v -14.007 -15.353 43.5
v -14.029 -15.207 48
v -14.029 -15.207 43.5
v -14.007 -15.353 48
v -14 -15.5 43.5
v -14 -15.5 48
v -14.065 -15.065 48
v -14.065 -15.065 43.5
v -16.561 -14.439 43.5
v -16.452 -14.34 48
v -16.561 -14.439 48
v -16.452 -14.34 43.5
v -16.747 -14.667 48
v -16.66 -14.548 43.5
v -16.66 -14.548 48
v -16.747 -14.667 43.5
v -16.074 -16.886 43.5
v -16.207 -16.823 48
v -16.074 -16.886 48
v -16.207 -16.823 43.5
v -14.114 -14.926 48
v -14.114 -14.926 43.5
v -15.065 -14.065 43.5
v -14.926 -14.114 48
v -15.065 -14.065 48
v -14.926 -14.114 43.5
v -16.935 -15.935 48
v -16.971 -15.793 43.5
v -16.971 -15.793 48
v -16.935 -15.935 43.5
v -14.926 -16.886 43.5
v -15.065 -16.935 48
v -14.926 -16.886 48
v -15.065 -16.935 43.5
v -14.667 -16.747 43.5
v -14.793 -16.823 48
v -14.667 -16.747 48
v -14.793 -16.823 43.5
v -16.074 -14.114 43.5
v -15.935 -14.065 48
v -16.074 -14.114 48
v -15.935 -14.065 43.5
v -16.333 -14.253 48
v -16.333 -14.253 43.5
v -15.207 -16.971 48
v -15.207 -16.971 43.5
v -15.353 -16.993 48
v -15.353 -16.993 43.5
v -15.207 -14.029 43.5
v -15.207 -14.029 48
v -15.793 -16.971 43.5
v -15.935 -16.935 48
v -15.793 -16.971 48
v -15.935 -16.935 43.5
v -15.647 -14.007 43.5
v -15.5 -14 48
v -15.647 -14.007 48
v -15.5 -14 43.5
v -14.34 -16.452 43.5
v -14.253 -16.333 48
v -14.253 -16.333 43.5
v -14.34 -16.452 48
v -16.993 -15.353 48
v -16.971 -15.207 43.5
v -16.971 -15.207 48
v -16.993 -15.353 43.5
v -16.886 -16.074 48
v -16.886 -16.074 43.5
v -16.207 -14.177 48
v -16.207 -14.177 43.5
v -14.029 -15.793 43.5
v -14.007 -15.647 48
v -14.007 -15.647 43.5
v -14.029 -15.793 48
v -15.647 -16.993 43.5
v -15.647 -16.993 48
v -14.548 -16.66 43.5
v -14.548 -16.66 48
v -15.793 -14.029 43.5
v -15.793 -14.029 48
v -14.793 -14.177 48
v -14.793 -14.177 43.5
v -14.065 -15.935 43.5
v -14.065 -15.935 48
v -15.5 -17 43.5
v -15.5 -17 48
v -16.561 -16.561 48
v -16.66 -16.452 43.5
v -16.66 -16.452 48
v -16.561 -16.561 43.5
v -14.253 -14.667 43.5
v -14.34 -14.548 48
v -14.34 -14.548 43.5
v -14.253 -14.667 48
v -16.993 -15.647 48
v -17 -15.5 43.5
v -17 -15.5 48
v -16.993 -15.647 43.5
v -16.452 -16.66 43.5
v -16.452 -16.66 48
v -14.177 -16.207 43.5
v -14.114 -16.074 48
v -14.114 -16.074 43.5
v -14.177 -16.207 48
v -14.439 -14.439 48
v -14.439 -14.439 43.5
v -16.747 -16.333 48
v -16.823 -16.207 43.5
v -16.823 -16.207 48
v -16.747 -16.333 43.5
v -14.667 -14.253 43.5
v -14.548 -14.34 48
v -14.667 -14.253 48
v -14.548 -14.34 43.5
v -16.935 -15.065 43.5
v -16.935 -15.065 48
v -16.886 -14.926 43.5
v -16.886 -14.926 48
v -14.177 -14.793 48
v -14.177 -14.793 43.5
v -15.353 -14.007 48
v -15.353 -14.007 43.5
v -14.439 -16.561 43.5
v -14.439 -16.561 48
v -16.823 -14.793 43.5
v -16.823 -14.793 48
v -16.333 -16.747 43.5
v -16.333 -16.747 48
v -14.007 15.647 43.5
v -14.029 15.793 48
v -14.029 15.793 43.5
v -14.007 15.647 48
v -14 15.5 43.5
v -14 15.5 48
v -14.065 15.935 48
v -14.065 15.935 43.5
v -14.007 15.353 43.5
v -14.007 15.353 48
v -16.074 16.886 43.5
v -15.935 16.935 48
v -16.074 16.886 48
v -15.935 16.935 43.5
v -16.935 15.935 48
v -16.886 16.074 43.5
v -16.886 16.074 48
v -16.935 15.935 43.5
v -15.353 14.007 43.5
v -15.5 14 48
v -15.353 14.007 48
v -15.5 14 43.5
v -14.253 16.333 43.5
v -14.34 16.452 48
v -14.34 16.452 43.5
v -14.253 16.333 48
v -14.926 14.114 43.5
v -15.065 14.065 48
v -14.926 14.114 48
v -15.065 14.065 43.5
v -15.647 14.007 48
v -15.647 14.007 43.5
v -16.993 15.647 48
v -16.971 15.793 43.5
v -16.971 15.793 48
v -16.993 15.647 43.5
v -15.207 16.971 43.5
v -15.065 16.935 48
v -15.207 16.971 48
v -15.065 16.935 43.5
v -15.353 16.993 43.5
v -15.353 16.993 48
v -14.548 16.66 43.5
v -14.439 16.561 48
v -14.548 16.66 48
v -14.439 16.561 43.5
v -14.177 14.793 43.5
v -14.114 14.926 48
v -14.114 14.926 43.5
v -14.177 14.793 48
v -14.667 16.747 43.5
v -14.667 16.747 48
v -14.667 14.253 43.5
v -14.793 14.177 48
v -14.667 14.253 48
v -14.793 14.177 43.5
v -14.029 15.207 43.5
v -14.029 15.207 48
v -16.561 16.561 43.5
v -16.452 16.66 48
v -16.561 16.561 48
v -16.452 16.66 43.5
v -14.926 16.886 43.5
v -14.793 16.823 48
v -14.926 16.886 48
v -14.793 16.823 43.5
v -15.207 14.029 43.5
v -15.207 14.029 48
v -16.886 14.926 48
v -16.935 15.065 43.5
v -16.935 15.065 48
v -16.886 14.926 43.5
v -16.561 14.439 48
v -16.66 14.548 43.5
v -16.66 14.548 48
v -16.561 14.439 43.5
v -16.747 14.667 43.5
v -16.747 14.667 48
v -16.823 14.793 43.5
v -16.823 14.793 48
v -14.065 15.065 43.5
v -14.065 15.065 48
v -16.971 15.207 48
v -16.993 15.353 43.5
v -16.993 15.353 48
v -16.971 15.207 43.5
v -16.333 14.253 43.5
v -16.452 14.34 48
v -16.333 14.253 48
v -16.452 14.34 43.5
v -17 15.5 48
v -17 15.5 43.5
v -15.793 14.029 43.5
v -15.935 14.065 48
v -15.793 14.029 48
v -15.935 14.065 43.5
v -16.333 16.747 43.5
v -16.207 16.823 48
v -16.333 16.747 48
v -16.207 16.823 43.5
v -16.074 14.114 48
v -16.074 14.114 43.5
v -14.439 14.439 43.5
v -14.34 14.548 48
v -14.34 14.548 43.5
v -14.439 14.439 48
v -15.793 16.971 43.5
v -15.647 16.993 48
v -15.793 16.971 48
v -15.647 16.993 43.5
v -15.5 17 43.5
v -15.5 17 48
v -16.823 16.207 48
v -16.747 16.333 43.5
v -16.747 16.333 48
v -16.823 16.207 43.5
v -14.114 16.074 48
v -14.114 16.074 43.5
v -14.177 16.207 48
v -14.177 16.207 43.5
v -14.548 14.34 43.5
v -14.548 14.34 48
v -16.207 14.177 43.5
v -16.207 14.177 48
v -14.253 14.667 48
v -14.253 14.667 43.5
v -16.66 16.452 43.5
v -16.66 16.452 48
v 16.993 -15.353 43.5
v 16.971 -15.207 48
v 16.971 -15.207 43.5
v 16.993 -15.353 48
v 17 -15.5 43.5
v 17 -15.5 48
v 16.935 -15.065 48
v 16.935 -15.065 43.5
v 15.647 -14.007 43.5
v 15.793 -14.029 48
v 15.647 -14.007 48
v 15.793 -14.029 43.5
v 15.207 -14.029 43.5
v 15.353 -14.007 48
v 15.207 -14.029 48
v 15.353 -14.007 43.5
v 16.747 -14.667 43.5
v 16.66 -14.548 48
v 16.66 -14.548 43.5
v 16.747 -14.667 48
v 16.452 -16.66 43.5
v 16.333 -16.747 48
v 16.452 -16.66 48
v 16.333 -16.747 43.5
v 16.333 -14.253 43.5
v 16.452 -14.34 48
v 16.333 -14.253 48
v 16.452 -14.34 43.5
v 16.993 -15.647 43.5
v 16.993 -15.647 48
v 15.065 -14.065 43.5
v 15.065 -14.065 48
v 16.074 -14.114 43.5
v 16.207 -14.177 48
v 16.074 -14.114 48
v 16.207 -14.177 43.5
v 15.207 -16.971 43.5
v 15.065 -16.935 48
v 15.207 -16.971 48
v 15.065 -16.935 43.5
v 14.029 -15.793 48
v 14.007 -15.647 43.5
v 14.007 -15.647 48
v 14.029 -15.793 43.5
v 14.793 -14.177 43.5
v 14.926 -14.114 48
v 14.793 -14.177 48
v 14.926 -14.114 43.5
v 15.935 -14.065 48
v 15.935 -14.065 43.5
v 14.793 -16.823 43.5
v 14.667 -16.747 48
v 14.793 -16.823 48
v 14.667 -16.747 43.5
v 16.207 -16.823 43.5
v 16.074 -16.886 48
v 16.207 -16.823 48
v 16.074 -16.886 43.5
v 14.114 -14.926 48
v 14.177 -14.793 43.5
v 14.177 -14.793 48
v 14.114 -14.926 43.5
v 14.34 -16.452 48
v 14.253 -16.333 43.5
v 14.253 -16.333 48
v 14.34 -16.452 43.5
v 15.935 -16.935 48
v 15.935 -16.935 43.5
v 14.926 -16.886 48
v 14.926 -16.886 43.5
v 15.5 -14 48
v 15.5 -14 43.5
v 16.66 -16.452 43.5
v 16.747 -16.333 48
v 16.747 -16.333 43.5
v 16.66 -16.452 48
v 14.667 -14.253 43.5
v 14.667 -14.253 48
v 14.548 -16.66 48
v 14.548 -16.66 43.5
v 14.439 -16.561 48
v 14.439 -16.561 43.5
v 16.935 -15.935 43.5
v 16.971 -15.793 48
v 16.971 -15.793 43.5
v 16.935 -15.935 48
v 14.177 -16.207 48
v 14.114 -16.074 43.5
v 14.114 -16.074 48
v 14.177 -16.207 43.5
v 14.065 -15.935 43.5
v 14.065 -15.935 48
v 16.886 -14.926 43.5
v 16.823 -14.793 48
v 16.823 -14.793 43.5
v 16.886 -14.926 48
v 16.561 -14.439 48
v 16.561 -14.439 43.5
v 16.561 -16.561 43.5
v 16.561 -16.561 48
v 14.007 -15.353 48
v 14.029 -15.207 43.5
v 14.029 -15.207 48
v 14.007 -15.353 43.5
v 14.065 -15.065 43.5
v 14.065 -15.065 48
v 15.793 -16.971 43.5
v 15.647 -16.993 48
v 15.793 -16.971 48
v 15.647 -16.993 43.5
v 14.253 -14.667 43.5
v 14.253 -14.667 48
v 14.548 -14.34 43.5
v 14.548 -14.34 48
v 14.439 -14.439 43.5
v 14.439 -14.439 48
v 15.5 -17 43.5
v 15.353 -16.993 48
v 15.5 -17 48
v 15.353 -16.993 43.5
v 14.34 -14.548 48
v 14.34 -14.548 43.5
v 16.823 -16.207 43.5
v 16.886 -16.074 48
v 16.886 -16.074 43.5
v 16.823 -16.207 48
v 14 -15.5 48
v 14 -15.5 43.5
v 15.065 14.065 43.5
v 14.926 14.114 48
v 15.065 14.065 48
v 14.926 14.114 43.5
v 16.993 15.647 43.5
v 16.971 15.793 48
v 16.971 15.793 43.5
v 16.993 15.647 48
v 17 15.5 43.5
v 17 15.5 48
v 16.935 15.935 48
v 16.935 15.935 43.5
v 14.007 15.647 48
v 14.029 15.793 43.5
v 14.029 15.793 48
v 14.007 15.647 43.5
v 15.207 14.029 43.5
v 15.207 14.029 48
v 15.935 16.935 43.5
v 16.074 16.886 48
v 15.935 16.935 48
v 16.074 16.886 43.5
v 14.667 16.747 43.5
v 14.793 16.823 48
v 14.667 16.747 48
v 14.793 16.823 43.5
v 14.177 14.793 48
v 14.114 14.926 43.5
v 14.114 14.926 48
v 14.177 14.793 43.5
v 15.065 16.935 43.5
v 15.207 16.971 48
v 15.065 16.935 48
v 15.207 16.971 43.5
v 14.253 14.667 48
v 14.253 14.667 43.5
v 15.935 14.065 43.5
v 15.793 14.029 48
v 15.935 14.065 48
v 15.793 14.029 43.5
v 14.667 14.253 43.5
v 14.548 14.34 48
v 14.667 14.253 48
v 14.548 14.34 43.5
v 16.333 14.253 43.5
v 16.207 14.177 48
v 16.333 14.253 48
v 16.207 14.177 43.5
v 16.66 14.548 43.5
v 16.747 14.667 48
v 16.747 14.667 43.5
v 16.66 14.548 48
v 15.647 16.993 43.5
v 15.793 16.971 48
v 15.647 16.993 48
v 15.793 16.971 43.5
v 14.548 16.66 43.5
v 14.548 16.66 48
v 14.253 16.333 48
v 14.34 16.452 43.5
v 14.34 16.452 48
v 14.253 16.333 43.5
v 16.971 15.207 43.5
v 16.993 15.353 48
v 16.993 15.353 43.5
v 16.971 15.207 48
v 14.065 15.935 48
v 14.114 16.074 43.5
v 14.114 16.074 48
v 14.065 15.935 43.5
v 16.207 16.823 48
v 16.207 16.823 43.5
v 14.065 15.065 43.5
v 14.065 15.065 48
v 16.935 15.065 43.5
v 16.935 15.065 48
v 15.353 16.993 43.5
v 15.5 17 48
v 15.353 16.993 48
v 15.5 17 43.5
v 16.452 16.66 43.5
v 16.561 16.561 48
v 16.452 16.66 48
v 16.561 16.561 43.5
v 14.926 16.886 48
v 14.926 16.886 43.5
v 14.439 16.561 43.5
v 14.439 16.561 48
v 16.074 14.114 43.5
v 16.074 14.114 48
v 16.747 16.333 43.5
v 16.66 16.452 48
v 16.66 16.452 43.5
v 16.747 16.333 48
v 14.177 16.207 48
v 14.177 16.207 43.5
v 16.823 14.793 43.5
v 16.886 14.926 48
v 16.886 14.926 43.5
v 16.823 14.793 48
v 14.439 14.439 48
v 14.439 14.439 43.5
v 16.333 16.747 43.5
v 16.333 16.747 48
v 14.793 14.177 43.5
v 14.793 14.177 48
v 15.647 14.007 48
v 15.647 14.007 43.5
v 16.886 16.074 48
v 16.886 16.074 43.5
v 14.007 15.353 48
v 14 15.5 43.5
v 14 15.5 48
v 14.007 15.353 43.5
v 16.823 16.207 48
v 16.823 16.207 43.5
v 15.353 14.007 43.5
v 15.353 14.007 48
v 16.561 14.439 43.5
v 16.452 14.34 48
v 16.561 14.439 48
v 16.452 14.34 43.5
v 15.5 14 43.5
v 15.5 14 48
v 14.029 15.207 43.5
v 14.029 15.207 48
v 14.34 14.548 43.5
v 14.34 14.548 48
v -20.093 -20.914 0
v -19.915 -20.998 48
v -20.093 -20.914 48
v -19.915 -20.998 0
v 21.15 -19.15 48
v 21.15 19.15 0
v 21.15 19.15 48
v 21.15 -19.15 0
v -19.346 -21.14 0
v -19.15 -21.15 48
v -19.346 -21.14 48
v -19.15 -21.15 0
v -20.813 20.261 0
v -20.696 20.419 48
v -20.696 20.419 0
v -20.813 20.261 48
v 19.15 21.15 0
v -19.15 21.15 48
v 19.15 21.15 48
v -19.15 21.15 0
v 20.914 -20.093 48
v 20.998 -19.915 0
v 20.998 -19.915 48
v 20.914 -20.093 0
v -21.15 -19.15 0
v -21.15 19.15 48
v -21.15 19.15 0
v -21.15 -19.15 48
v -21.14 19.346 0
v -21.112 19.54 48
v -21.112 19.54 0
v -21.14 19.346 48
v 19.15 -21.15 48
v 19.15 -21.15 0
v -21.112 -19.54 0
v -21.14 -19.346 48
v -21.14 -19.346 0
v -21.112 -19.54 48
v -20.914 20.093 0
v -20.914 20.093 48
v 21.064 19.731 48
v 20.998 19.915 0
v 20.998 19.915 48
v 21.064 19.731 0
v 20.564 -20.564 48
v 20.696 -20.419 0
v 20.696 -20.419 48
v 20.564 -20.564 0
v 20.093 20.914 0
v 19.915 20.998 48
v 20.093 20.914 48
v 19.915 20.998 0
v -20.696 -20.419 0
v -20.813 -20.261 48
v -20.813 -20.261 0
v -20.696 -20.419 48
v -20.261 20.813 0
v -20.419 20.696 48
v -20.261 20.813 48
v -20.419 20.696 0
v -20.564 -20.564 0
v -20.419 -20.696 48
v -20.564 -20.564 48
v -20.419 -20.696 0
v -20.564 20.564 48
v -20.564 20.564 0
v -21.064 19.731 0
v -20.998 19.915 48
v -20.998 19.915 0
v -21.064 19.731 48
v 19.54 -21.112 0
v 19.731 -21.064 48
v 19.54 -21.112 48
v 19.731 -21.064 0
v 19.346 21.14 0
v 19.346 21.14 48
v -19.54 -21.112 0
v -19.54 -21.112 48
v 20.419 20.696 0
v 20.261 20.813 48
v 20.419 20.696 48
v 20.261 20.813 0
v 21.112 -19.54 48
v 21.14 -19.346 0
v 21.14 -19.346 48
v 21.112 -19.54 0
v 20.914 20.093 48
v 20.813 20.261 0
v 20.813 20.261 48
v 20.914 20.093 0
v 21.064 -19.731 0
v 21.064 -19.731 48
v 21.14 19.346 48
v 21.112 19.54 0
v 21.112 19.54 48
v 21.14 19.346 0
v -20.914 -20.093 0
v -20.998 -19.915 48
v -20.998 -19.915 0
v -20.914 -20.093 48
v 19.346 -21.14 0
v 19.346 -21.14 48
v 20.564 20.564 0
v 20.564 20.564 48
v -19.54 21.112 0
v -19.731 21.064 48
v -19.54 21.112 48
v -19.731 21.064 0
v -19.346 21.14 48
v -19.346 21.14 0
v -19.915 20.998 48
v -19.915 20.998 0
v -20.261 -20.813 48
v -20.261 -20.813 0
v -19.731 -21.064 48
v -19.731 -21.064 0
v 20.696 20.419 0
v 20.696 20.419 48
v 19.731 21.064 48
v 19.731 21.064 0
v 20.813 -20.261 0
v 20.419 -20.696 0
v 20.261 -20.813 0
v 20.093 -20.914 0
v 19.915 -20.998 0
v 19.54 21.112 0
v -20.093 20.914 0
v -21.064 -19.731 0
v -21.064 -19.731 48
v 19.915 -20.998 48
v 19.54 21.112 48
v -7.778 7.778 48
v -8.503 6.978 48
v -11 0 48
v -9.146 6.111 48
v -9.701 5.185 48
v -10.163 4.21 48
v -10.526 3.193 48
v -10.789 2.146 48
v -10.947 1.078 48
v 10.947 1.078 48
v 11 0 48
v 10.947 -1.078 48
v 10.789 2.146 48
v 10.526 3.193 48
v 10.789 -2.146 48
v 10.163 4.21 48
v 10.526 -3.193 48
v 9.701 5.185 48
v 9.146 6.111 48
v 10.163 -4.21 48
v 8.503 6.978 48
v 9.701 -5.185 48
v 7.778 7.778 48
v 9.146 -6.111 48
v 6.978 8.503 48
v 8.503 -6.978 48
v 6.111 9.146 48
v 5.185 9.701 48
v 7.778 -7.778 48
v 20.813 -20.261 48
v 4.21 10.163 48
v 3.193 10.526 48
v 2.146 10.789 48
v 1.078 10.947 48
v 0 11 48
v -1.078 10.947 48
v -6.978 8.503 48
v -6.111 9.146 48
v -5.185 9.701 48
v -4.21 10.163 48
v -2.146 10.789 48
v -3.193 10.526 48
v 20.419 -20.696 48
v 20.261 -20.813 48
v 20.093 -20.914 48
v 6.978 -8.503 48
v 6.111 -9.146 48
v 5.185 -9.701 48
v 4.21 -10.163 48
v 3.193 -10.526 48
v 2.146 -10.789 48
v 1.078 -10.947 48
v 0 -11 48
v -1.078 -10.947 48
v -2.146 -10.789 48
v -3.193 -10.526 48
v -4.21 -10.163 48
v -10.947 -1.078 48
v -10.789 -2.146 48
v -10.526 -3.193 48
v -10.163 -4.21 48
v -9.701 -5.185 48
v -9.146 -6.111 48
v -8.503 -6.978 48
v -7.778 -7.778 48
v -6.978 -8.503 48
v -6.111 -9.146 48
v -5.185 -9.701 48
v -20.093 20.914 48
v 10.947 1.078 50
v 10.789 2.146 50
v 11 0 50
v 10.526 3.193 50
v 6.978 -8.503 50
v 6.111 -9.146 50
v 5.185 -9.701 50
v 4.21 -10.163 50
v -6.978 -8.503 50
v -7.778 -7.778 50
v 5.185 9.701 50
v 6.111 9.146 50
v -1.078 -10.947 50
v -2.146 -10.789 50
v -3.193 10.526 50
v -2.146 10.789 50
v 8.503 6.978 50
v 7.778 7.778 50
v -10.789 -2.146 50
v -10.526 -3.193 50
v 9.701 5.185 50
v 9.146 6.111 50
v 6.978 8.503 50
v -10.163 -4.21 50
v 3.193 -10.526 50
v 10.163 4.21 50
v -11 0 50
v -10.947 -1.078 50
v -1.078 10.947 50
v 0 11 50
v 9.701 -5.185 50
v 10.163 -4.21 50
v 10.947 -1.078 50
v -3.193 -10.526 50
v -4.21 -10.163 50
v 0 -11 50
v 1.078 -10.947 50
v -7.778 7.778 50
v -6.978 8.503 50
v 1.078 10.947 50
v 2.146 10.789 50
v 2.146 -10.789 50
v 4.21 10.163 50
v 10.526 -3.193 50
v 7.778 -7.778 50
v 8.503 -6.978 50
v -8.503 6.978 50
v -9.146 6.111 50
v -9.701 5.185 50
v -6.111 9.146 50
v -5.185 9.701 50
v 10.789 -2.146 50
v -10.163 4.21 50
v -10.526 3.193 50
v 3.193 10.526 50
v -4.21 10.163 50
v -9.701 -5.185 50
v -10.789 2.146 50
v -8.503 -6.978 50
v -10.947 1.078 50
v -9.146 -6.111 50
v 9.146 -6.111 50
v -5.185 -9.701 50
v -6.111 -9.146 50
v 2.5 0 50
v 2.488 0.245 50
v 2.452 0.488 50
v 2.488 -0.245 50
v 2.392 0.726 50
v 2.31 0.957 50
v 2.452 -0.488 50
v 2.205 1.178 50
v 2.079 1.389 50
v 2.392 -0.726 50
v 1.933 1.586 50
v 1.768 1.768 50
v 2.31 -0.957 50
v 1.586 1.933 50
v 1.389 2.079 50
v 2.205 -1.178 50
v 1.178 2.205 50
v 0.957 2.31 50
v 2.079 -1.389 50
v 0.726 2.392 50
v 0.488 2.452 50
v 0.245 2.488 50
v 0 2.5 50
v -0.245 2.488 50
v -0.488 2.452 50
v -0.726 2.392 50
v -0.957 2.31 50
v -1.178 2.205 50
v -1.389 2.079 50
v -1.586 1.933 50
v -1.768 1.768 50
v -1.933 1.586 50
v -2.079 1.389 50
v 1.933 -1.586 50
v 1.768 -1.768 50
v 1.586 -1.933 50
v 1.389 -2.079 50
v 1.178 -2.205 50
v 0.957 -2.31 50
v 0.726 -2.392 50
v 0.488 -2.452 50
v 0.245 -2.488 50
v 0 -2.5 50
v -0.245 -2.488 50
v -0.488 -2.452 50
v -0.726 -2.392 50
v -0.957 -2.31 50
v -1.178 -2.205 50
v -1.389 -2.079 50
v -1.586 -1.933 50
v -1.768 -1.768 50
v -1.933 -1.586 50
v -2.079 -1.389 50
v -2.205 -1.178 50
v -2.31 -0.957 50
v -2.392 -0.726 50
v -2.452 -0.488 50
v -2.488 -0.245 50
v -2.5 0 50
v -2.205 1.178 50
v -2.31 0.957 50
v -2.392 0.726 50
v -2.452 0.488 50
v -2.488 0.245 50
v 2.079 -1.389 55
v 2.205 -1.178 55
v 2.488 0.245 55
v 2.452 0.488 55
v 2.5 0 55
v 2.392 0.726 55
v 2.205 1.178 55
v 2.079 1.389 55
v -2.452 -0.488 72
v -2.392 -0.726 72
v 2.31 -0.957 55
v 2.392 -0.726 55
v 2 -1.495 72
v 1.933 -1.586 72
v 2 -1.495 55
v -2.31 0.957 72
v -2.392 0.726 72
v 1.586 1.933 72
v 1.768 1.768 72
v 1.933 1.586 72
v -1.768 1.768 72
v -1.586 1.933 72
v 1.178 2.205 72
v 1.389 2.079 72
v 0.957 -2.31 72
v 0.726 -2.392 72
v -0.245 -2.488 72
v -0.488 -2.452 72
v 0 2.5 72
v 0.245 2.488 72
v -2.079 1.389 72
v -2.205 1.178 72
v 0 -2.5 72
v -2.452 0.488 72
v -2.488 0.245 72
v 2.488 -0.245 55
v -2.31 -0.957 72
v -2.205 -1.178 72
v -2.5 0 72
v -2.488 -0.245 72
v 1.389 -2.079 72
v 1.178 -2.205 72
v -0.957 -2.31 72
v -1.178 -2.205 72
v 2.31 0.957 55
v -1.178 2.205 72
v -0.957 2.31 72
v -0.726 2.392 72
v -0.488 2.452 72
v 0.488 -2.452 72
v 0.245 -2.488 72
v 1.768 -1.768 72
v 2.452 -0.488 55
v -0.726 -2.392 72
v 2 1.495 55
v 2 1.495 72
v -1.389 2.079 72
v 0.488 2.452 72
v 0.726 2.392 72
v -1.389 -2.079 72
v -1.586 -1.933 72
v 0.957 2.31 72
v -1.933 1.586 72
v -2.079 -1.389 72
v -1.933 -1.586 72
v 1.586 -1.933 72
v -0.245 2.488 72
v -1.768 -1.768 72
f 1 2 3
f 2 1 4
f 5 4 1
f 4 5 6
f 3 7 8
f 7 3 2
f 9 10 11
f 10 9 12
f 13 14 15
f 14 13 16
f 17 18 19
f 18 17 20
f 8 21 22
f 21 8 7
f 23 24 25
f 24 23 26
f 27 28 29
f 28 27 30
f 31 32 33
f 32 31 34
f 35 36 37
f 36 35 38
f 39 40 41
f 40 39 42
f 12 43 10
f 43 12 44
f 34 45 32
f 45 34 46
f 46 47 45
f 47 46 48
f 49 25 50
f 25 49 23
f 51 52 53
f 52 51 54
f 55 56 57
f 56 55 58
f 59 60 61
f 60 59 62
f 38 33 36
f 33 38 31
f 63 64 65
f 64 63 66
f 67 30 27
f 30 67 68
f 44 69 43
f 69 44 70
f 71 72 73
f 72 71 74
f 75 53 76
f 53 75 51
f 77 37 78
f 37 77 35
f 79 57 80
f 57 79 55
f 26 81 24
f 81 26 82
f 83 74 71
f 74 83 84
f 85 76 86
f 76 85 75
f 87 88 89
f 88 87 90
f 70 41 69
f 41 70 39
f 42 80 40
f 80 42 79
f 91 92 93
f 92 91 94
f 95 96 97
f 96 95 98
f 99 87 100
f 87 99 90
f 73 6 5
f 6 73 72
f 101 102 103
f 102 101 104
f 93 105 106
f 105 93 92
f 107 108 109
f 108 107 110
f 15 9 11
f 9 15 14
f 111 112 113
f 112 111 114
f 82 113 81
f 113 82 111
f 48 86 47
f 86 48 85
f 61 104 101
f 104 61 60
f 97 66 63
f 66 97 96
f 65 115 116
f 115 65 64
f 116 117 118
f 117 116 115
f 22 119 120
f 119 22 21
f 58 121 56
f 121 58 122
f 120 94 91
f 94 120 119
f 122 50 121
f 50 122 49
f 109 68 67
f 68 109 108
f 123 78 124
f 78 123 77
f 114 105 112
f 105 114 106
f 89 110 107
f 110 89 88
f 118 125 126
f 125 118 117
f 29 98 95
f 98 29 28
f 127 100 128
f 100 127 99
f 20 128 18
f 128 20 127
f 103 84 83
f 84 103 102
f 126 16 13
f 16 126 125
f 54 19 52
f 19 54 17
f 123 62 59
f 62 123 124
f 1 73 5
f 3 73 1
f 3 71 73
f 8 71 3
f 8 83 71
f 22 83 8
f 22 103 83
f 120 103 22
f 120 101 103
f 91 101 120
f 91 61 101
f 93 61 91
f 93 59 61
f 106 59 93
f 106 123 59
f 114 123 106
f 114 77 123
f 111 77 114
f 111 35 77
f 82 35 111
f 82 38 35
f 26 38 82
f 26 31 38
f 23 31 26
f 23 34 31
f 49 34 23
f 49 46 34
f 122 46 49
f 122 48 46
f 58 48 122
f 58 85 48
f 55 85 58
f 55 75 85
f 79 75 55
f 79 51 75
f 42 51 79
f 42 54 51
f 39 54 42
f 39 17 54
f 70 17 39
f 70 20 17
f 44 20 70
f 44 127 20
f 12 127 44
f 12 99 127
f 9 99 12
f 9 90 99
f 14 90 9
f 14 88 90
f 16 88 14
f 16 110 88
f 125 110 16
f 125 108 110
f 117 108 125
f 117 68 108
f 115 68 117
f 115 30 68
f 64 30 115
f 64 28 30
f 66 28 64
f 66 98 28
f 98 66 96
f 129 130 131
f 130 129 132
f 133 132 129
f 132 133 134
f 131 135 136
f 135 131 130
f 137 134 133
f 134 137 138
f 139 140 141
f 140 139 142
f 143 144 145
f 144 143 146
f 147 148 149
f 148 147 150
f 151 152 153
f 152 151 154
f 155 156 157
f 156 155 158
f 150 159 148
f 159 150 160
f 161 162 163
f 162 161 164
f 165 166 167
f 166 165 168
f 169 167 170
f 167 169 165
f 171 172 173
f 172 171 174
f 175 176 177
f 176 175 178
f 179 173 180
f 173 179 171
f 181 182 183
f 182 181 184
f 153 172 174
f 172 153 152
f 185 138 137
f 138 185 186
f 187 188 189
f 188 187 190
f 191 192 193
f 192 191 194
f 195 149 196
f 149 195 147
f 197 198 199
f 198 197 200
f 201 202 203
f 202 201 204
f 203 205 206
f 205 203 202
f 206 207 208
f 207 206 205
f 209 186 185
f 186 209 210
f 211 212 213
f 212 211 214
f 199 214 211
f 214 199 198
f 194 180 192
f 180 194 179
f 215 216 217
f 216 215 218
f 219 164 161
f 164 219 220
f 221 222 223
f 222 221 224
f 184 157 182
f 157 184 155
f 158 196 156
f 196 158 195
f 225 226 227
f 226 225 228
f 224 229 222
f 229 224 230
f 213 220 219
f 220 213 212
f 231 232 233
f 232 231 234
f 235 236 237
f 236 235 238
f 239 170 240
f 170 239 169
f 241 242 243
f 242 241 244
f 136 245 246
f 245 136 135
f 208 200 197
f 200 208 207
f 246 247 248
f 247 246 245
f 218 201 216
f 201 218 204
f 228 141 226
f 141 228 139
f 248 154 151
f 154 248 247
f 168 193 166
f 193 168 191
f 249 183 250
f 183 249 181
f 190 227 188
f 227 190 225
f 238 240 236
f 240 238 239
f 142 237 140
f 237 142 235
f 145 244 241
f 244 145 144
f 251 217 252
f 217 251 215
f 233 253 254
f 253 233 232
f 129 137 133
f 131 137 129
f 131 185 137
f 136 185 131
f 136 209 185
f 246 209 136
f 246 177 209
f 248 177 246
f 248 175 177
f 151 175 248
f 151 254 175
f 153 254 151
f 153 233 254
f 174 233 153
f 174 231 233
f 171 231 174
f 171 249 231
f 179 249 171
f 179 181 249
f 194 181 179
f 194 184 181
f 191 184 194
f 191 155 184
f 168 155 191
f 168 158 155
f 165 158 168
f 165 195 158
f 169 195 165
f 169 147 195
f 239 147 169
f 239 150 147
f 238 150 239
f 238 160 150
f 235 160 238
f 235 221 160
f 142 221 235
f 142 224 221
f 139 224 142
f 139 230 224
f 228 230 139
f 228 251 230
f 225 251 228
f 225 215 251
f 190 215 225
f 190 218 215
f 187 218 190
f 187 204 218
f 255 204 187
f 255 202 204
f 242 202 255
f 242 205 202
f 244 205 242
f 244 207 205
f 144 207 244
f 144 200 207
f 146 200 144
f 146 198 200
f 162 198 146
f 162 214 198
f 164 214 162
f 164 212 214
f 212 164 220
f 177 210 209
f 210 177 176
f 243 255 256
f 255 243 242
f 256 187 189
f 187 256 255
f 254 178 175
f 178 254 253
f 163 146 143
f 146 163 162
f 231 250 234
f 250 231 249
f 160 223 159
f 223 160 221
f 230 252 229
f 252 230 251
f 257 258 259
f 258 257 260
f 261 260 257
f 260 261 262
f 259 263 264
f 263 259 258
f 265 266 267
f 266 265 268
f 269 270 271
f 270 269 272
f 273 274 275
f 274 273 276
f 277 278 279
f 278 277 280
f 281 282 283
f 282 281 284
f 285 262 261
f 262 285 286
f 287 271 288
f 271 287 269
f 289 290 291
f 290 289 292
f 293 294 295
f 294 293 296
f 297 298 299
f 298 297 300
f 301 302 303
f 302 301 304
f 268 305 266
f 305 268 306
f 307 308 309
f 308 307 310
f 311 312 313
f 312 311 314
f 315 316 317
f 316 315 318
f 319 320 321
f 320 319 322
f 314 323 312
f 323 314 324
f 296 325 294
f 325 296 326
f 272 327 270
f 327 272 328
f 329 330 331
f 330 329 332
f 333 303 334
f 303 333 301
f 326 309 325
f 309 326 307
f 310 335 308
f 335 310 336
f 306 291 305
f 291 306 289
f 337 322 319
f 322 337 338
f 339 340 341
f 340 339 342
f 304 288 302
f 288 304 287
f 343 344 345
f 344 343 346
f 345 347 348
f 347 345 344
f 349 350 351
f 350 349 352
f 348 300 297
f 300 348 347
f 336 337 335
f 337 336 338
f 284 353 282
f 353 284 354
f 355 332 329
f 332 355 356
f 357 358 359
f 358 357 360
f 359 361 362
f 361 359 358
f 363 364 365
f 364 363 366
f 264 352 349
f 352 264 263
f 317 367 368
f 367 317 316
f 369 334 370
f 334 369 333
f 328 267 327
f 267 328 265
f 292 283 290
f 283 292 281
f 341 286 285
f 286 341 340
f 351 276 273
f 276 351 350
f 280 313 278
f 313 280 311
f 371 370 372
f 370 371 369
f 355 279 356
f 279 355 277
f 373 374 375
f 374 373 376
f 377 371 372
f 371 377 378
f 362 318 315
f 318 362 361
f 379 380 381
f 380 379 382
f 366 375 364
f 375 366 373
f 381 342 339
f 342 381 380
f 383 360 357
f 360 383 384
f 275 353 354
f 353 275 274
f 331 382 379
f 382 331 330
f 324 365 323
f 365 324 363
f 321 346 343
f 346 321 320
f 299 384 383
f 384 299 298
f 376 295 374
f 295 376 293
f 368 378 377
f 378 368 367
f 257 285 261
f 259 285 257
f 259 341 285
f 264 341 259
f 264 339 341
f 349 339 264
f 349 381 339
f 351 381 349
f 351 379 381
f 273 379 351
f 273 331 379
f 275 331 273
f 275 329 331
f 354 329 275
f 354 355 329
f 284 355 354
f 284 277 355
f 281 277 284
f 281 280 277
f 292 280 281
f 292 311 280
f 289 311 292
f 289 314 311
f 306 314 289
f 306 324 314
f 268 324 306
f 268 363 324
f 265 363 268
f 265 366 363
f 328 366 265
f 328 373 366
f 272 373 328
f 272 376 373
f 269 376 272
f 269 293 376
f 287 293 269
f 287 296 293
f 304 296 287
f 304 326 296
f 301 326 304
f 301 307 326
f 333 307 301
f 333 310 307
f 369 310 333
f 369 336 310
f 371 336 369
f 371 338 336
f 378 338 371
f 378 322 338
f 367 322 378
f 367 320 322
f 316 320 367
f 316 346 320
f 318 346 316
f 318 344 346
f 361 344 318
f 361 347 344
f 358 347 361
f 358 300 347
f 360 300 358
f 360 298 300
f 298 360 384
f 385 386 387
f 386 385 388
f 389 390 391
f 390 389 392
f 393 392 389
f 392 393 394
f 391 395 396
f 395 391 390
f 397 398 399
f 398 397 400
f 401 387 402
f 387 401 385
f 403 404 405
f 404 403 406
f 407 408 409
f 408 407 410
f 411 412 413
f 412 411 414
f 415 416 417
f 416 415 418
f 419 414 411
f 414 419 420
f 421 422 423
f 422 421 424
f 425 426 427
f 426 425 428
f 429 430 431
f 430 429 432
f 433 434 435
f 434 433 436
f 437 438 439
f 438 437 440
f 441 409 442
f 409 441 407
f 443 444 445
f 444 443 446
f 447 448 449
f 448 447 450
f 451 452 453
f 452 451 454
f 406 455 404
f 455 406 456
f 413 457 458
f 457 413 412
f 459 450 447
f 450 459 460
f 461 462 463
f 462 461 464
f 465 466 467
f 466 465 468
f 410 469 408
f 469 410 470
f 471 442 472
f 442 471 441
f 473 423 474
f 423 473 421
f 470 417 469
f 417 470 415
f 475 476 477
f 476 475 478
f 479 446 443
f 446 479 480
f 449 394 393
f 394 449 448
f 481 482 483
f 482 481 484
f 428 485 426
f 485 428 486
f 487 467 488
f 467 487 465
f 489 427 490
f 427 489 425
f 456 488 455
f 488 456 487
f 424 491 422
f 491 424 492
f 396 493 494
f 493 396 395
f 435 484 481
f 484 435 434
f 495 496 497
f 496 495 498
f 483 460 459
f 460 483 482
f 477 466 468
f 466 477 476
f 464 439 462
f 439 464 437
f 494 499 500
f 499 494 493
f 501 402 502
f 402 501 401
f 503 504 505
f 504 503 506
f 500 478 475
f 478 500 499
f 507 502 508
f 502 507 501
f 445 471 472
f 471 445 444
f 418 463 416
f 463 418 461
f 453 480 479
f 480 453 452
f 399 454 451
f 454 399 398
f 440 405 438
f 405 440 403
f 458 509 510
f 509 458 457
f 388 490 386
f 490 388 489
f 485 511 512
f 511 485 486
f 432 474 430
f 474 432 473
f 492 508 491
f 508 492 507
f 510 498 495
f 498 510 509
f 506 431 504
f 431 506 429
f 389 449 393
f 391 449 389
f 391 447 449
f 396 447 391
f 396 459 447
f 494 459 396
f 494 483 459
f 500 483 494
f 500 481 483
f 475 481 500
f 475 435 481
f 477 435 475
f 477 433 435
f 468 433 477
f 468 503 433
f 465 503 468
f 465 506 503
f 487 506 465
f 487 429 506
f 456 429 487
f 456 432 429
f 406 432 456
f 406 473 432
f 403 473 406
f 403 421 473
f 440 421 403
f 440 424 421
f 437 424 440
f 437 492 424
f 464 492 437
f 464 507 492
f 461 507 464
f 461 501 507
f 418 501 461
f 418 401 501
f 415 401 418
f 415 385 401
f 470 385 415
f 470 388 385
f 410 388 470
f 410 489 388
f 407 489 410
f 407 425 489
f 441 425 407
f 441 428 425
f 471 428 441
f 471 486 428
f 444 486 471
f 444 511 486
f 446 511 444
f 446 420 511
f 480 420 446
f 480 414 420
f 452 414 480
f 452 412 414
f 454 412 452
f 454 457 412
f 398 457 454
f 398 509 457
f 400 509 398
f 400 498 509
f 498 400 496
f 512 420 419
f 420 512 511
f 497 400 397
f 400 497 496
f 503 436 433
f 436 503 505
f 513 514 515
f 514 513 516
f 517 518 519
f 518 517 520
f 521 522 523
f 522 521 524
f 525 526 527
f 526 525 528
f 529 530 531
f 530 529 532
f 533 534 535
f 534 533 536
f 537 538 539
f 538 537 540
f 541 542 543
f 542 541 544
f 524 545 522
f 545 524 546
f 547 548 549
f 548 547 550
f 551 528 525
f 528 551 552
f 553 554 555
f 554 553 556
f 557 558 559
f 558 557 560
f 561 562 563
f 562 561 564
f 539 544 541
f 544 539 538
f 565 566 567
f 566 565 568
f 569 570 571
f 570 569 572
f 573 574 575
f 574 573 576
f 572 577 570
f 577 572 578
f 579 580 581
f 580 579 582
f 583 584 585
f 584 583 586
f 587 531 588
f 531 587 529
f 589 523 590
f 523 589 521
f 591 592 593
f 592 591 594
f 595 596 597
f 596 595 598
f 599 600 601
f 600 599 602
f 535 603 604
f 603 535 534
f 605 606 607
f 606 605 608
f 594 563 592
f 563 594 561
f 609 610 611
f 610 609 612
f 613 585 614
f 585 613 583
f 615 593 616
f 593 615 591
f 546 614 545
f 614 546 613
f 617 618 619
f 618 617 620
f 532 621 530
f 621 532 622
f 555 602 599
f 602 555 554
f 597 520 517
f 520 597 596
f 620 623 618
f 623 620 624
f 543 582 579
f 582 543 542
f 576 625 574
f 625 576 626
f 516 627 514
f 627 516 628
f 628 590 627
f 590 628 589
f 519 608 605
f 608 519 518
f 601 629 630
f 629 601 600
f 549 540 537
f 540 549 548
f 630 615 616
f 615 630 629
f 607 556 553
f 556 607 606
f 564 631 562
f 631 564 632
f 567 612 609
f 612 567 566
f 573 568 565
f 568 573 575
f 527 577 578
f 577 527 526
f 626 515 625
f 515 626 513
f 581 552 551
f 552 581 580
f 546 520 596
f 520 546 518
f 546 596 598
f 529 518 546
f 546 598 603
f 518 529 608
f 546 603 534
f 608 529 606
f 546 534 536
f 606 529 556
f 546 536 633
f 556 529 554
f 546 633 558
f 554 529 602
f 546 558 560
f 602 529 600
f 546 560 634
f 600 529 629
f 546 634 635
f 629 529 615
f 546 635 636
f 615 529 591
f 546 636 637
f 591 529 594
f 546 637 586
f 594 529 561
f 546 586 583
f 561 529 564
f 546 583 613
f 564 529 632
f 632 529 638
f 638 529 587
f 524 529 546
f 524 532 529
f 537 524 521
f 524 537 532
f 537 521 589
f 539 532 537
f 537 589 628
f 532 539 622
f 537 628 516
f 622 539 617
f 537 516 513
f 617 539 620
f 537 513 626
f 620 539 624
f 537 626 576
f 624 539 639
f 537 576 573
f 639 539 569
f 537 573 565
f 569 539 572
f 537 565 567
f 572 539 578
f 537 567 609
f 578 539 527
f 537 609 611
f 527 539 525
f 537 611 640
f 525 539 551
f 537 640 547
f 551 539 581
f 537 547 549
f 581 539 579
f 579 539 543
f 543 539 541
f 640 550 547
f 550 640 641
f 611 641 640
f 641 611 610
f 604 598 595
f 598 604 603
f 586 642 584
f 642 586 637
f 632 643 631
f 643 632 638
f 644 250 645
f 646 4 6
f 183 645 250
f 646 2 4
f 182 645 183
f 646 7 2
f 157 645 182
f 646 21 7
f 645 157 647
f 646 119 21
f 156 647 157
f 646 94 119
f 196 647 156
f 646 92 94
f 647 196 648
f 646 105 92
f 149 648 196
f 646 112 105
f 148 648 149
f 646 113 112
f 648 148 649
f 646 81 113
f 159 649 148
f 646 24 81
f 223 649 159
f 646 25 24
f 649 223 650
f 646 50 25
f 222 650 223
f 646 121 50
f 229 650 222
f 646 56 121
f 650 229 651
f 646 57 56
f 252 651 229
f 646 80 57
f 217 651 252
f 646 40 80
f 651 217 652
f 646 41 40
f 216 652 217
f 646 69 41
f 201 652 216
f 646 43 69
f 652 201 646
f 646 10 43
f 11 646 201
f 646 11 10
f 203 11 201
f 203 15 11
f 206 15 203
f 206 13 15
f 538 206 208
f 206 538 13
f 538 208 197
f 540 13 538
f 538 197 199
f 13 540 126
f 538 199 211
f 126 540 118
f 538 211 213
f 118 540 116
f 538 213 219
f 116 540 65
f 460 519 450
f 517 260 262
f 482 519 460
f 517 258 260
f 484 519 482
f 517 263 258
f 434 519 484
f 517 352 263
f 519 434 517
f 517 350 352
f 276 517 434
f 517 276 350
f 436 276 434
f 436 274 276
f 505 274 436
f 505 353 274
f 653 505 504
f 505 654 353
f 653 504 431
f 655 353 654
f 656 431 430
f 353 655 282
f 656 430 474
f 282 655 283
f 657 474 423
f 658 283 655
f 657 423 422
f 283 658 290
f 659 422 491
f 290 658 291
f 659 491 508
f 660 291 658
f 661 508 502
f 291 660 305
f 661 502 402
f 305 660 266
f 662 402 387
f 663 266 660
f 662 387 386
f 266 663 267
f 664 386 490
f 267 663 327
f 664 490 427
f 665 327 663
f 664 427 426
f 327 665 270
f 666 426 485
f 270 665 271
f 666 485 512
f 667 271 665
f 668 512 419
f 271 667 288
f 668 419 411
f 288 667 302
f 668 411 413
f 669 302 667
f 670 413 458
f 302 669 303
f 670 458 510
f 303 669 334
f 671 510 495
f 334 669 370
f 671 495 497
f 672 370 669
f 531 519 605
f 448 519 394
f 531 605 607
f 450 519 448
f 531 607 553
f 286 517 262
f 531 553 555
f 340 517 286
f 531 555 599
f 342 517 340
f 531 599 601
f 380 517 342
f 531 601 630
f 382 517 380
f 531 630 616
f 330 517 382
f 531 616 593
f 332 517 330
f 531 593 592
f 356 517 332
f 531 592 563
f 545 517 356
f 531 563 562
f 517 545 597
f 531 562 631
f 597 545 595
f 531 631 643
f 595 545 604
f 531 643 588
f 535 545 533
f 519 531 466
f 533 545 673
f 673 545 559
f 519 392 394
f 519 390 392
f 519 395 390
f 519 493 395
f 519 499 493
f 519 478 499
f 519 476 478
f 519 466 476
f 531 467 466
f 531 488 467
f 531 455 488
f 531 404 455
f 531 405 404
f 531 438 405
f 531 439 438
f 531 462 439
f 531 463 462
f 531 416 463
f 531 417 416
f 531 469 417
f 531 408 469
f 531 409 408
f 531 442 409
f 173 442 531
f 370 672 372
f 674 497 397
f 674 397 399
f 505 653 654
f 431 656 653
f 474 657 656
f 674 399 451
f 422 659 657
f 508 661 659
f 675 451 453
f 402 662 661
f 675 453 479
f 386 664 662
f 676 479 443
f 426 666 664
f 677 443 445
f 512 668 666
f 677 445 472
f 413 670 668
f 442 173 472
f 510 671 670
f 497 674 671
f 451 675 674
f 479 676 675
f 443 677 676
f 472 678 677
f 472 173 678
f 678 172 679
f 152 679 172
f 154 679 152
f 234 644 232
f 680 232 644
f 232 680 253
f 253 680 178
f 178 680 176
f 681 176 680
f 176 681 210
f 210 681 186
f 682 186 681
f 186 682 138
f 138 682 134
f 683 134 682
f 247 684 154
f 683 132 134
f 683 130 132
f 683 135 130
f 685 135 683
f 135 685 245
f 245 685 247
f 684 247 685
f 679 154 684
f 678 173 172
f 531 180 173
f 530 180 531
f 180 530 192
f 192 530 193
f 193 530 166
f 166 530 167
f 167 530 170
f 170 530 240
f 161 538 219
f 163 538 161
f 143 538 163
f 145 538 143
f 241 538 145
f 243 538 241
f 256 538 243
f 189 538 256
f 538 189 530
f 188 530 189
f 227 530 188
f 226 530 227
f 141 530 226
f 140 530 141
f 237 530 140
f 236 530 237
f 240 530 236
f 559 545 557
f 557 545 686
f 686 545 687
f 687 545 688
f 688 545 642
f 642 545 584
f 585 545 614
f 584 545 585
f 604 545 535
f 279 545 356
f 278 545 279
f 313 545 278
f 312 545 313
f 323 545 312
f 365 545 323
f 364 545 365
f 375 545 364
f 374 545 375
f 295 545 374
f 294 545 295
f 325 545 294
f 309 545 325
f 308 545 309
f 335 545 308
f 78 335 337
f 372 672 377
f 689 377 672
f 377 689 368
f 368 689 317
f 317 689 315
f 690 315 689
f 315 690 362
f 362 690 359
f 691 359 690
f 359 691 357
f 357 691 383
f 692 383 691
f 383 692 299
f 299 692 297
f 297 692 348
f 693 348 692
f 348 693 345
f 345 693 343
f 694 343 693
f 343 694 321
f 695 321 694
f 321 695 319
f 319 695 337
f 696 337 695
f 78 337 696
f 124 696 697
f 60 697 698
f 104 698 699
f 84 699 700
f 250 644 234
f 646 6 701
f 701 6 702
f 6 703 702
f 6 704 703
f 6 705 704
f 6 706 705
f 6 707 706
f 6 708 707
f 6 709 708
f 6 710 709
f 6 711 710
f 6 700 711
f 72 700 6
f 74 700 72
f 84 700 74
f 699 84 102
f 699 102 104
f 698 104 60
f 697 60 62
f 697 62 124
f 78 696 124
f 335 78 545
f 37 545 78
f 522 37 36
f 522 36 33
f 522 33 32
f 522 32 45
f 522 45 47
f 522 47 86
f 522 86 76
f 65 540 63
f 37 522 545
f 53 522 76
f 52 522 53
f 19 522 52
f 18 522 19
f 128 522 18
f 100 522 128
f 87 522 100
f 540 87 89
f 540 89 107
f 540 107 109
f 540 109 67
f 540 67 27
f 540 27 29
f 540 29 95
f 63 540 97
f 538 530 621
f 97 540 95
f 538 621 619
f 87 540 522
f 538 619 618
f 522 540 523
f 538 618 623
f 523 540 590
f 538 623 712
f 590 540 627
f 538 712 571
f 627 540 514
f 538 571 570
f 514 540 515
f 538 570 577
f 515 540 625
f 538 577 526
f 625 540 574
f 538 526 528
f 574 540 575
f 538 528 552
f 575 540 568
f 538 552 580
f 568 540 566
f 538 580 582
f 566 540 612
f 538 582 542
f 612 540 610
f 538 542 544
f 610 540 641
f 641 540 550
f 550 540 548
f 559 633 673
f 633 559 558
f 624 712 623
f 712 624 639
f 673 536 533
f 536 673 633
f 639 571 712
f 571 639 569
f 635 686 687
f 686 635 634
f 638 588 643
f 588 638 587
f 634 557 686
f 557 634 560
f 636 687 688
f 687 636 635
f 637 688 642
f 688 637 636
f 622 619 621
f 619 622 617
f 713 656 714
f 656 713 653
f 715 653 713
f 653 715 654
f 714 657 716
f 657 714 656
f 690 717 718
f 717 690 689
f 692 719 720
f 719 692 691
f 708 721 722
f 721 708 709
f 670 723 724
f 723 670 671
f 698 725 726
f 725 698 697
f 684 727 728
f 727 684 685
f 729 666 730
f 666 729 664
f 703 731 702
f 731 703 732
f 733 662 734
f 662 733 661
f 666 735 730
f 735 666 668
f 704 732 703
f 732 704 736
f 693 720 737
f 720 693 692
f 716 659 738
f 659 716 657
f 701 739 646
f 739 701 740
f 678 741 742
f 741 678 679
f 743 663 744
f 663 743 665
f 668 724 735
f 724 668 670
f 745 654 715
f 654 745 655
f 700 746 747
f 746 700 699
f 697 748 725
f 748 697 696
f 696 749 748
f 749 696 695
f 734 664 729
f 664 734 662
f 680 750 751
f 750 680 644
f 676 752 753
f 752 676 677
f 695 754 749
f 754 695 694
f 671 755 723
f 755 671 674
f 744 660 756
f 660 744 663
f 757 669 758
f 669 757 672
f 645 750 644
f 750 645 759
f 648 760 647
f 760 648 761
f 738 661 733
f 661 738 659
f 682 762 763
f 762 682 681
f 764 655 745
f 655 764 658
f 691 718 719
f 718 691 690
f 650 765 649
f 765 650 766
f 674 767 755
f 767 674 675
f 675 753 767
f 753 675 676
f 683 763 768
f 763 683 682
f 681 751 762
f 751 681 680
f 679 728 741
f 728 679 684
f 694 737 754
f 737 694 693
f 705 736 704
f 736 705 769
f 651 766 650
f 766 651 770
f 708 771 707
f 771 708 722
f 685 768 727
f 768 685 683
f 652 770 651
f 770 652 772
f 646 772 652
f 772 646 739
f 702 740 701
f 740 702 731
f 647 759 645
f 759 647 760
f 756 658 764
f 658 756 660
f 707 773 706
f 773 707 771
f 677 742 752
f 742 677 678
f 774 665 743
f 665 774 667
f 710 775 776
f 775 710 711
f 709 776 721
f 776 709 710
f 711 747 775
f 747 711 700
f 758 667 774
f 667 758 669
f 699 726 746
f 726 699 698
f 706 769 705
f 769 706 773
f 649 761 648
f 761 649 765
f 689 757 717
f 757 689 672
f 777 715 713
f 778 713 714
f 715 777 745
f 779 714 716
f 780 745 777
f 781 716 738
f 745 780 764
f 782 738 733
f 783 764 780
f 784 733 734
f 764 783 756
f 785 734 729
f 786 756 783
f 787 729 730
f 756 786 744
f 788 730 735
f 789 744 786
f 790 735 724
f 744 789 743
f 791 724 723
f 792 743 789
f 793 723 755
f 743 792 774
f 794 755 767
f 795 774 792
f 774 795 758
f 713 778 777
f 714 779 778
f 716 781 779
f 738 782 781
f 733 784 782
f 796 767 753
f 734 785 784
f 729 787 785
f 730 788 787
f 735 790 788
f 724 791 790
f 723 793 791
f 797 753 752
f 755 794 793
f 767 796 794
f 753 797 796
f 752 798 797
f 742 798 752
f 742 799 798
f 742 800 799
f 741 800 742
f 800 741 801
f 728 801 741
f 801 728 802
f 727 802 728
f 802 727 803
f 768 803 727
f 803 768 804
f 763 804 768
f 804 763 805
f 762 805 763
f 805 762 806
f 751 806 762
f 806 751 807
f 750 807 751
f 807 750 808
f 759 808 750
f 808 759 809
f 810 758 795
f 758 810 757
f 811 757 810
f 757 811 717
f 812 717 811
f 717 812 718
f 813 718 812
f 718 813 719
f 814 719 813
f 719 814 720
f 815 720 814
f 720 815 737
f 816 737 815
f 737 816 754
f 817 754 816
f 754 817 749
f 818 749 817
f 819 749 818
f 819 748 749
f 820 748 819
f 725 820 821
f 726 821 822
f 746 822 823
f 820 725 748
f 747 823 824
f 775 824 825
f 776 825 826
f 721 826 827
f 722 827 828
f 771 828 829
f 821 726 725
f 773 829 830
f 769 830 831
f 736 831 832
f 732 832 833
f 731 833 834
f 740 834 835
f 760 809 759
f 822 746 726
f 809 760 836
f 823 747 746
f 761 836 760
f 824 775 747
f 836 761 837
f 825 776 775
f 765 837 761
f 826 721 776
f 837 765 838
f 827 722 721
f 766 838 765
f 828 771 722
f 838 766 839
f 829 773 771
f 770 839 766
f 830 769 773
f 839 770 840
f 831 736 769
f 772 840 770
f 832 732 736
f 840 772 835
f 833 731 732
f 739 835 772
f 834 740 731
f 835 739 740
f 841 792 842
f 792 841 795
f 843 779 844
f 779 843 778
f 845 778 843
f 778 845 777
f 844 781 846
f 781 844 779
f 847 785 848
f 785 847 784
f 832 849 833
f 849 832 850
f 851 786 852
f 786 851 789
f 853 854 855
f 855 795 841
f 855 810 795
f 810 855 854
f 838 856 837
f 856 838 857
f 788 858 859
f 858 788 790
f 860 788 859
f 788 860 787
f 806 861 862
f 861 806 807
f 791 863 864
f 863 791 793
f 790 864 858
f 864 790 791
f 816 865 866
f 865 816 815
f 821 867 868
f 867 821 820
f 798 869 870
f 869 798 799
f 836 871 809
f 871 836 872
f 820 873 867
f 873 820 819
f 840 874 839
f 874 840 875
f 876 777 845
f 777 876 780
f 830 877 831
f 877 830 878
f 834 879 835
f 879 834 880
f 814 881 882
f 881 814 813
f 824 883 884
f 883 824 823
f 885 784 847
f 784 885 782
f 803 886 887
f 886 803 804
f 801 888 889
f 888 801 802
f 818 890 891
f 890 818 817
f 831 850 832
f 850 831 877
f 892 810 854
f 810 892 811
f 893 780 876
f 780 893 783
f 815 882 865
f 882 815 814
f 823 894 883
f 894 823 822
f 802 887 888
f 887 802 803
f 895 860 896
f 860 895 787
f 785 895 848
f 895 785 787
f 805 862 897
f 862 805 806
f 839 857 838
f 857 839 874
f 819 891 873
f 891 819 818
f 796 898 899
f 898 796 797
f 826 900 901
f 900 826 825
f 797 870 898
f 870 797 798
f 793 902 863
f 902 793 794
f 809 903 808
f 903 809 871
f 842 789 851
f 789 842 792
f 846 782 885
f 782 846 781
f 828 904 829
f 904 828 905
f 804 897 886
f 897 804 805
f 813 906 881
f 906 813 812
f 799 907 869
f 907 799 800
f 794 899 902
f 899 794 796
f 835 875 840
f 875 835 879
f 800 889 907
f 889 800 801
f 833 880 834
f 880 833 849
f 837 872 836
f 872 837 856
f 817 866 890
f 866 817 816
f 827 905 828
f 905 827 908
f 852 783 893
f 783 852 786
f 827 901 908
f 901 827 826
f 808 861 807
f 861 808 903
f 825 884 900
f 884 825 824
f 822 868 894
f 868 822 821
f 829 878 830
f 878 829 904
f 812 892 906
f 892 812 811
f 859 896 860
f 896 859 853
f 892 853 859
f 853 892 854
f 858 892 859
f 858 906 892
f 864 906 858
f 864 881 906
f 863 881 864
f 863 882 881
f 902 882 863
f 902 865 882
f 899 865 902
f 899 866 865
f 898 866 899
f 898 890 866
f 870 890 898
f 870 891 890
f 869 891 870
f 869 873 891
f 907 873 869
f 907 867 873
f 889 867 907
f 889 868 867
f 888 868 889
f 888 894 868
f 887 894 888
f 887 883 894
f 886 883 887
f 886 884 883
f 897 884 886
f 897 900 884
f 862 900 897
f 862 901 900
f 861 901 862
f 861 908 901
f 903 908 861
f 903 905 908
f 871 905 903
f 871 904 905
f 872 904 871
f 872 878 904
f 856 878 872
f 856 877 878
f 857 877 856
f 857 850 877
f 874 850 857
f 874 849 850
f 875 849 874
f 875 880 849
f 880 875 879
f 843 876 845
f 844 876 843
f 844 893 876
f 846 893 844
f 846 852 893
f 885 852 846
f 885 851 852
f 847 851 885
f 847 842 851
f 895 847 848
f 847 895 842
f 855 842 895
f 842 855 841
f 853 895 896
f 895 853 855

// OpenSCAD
// --- Motor Dimensions (NEMA 17 / 42BYGHW811) ---
body_width = 42.3;      // Square body width
body_height = 48;       // Height of the "811" model body
boss_radius = 22 / 2;   // The circular raised part on top
boss_height = 2;        // Height of the boss
shaft_radius = 5 / 2;   // 5mm diameter shaft
shaft_length = 24;      // Length of the shaft from the motor face
hole_spacing = 31;      // Distance between mounting holes
hole_depth = 4.5;       // Depth of M3 holes
$fn = 64;               // Smoothness of circles

// --- Render the Motor ---
color("SlateGray") motor_body();
color("Silver") motor_shaft();

// --- Modules ---

module motor_body() {
    difference() {
        // Main block with rounded corners
        hull() {
            for(x=[-1,1], y=[-1,1])
                translate([x*(body_width/2 - 2), y*(body_width/2 - 2), 0])
                    cylinder(h=body_height, r=2);
        }
        
        // Mounting Holes (M3)
        for(x=[-1,1], y=[-1,1])
            translate([x*hole_spacing/2, y*hole_spacing/2, body_height - hole_depth])
                cylinder(h=hole_depth + 1, r=1.5);
    }
    
    // Top Boss (circular alignment ridge)
    translate([0, 0, body_height])
        cylinder(h=boss_height, r=boss_radius);
}

module motor_shaft() {
    translate([0, 0, body_height])
        difference() {
            // Main shaft
            cylinder(h=shaft_length, r=shaft_radius);
            
            // D-cut (The flat side)
            // The 811 usually has a flat side for set screws
            translate([shaft_radius - 0.5, -shaft_radius, boss_height + 5])
                cube([1, shaft_radius*2, shaft_length]);
        }
}
